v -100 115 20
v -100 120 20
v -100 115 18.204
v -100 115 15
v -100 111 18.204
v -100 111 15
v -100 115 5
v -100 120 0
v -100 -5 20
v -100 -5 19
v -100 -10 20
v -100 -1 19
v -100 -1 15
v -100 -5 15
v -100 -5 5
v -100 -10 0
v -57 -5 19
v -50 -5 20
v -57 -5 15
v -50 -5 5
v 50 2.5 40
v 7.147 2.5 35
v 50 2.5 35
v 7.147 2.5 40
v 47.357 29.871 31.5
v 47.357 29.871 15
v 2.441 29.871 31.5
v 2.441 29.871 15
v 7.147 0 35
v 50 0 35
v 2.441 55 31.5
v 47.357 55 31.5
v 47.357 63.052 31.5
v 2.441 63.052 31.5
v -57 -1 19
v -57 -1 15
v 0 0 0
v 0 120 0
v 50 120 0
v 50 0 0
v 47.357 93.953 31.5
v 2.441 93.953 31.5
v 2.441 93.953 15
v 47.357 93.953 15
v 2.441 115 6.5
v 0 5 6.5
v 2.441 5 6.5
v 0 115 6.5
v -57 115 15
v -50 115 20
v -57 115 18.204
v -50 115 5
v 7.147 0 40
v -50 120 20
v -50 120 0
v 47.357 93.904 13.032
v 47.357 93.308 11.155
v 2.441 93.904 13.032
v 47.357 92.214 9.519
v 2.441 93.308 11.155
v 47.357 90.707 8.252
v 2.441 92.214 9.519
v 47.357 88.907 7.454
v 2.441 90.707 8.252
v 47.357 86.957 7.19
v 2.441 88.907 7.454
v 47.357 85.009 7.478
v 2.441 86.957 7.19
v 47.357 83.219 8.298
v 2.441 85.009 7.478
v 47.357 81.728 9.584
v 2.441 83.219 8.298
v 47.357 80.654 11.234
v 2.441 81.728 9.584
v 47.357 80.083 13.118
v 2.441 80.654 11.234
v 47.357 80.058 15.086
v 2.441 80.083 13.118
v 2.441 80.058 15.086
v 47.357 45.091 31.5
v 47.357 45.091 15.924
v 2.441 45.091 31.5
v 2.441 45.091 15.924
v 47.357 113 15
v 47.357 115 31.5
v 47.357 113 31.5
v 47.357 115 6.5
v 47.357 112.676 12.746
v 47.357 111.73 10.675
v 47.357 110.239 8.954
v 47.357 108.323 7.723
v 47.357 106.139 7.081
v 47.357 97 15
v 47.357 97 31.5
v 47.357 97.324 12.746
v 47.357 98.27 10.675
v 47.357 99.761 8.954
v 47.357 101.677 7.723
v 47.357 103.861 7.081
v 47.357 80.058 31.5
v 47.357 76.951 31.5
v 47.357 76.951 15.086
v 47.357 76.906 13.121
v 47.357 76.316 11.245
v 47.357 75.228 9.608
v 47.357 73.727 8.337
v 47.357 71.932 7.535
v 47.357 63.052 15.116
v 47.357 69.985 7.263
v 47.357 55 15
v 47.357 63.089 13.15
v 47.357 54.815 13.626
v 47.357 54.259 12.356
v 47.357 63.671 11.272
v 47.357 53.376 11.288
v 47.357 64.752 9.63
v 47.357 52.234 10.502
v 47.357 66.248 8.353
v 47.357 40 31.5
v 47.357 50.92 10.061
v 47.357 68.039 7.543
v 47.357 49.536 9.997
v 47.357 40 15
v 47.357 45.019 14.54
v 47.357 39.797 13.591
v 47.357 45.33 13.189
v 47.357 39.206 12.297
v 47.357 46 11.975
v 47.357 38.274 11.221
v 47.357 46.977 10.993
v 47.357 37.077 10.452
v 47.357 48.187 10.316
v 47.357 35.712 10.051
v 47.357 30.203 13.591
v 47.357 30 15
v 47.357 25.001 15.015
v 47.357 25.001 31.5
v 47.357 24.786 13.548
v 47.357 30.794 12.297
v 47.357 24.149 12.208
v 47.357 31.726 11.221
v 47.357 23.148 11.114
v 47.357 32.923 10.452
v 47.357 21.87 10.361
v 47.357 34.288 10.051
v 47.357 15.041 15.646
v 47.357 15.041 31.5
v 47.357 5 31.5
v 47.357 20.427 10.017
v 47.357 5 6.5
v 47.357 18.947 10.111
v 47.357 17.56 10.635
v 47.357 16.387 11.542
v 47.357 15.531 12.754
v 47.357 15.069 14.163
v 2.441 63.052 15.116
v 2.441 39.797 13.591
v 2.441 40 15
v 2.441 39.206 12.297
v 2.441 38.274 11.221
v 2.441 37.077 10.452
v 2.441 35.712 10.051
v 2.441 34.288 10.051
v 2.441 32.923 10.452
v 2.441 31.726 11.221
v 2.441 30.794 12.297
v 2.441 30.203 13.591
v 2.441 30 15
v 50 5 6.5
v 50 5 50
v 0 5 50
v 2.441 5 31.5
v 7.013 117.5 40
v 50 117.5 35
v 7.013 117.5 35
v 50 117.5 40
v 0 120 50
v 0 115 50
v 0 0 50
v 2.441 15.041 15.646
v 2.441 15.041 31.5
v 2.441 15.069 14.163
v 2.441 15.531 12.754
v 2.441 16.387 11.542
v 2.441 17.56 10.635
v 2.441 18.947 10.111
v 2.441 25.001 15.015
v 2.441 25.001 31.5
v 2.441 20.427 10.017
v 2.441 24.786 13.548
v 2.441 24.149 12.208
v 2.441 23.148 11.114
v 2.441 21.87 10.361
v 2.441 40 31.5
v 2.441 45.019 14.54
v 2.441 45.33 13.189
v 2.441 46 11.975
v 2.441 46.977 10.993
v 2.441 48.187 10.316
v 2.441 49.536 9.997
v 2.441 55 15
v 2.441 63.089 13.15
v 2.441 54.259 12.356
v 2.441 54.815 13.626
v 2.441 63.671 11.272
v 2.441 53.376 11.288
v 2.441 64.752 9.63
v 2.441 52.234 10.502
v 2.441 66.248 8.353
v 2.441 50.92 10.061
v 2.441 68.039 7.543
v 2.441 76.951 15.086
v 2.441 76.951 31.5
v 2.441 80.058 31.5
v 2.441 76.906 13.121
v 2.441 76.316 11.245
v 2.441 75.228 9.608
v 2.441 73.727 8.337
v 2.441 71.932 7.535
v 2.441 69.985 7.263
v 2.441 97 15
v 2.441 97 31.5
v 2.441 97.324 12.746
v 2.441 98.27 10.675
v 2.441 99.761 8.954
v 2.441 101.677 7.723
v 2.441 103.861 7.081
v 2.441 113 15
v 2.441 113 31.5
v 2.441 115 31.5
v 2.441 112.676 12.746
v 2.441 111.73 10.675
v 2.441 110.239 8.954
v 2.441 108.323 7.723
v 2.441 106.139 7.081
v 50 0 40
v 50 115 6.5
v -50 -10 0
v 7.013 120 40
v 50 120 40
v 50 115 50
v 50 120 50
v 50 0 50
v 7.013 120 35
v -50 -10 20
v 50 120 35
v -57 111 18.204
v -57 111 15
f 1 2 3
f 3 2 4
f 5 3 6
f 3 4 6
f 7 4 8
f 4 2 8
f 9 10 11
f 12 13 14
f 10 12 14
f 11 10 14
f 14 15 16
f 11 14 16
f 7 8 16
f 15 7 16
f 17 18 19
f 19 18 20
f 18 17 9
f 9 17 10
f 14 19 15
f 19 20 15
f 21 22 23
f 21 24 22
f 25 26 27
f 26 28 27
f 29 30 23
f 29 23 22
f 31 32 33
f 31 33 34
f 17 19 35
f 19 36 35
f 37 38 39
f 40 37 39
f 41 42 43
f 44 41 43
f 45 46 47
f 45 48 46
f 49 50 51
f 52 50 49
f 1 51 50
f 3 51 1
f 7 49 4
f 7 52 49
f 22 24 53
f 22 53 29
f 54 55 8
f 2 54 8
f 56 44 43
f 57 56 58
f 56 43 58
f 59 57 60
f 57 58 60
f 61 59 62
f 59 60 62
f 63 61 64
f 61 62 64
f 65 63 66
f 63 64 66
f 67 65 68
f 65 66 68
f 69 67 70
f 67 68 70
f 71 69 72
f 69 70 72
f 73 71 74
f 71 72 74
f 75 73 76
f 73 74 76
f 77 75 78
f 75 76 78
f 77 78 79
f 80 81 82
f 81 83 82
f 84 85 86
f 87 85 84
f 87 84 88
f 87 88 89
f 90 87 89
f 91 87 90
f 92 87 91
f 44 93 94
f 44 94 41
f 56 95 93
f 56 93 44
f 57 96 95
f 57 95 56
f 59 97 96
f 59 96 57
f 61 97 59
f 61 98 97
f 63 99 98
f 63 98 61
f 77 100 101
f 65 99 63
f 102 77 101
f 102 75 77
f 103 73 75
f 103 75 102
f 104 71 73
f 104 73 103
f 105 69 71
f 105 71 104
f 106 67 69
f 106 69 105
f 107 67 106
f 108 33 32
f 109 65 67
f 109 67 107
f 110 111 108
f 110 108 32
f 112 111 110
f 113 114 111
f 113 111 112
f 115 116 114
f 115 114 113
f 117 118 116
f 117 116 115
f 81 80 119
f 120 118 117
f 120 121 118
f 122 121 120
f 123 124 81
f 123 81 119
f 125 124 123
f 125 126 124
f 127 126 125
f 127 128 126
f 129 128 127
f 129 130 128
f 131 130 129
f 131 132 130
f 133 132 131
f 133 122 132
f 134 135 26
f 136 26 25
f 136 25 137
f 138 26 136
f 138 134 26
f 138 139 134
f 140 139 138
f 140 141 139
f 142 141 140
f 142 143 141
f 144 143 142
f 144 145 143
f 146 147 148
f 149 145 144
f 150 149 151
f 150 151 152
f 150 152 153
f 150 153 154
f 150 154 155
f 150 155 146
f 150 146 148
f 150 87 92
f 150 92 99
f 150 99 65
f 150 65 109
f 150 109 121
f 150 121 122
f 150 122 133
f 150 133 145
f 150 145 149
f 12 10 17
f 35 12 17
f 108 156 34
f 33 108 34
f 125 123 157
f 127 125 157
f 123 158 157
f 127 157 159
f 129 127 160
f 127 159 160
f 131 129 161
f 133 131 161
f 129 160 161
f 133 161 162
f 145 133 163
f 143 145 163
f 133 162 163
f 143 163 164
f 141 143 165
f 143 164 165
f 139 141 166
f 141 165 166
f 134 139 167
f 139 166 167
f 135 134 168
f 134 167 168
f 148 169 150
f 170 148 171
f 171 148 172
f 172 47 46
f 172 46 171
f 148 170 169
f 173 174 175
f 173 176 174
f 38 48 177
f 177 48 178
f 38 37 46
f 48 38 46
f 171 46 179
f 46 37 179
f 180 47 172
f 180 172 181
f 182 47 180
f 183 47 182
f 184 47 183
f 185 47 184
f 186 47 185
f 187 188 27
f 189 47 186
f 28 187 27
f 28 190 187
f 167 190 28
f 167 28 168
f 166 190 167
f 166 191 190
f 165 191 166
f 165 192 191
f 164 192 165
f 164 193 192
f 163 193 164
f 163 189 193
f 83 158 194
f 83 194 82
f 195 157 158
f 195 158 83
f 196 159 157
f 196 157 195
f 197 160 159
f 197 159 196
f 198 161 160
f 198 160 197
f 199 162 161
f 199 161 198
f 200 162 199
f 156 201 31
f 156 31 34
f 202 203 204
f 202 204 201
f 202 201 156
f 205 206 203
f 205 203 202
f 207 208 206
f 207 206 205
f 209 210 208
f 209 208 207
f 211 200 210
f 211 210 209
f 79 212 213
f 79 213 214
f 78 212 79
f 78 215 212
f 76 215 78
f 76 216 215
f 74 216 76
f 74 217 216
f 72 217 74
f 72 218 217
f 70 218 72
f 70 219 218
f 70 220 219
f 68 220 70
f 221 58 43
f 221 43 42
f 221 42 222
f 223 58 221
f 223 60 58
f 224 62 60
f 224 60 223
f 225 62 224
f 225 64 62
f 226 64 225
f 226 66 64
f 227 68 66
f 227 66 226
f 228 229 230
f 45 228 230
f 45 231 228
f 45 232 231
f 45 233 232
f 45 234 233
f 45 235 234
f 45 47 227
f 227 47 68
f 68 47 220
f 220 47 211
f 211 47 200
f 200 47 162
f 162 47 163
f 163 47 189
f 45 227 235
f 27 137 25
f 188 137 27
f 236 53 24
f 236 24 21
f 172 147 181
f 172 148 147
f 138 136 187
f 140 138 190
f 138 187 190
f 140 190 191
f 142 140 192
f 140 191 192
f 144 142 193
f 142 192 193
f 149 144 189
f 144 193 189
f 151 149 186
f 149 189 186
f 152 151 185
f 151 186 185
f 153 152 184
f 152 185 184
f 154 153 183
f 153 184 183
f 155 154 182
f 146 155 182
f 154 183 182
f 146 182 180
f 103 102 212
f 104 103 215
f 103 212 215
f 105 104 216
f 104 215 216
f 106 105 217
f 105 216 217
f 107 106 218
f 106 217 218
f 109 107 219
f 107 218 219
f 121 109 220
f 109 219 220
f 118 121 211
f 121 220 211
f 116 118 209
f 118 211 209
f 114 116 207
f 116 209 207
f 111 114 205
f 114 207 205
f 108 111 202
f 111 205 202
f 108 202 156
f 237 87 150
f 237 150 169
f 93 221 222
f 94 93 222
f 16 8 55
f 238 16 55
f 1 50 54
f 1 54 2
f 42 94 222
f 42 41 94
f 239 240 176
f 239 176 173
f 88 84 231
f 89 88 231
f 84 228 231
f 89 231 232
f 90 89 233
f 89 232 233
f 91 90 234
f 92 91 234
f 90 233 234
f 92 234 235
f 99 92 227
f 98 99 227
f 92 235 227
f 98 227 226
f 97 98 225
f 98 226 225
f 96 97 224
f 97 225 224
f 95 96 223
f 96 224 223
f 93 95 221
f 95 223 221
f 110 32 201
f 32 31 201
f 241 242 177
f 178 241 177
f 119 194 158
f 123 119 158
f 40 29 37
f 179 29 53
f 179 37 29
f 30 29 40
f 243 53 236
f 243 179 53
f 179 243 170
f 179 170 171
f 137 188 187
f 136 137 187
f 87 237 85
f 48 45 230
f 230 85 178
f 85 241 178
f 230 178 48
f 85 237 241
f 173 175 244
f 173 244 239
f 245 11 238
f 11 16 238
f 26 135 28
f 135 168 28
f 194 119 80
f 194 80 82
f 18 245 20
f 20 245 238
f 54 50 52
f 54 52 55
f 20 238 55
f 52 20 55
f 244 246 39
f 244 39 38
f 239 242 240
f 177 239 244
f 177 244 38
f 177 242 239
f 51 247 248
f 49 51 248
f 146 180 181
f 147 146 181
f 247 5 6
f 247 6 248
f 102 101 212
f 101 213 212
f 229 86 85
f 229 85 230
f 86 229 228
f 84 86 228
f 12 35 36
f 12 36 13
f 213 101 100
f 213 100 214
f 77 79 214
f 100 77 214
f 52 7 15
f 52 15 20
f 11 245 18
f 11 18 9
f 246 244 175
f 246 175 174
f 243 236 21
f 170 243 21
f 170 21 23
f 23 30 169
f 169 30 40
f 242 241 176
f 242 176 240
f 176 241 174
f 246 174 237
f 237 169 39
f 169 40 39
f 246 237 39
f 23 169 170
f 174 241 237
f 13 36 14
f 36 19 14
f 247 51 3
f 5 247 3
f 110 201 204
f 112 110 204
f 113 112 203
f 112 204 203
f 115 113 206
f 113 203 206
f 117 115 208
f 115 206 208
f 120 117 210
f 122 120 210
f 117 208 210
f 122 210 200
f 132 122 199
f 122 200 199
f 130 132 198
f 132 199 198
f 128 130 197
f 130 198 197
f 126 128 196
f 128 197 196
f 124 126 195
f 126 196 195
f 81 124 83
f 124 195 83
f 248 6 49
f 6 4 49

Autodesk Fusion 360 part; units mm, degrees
sketch "Sketch1" plane through (0, 0, 0) normal (0, 0, 1) x (1, 0, 0)
  line L0 (0, 0) -> (50, 0)
  line L1 (50, 0) -> (50, 120)
  line L2 (50, 120) -> (0, 120)
  line L3 (0, 120) -> (0, 0)
extrude "Extrude1" add sketch "Sketch1" along normal blind 6.5 makes body 1
sketch "Sketch2" plane through (0, 0, 6.5) normal (0, 0, 1) x (-1, 0, 0)
  line L0 (0, -120) -> (0, 0)
  line L1 (0, 0) -> (-50, 0)
  line L2 (-50, 0) -> (-50, -120)
  line L3 (-50, -120) -> (0, -120)
  line L4 (0, 0) -> (-50, 0)
  line L5 (-50, 0) -> (-50, -5)
  line L6 (-50, -5) -> (0, -5)
  line L7 (0, -5) -> (0, 0)
extrude "Extrude2" add sketch "Sketch2" along normal blind 40 contours L0 L1 L2 L4 L5 L6 L7 bodies 1
sketch "Sketch3" plane through (0, 0, 6.5) normal (0, 0, 1) x (-1, 0, 0)
  line L0 (0, -5) -> (-50, -5)
  line L1 (-50, -5) -> (-50, -120)
  line L2 (-50, -120) -> (0, -120)
  line L3 (0, -120) -> (0, -5)
  line L4 (-50, -120) -> (0, -120)
  line L5 (0, -120) -> (0, -115)
  line L6 (0, -115) -> (-50, -115)
  line L7 (-50, -115) -> (-50, -120)
extrude "Extrude3" add sketch "Sketch3" along normal blind 40 contours L1 L2 L3 L4 L5 L6 L7 bodies 1
sketch "Sketch4" plane through (0, 120, 0) normal (0, 1, 0) x (-1, 0, 0)
  line L0 (-50, 0) -> (0, 0)
  line L1 (0, 0) -> (0, 46.5)
  line L2 (0, 46.5) -> (-50, 46.5)
  line L3 (-50, 46.5) -> (-50, 0)
  line L4 (-50, 46.5) -> (-50, 50)
  line L5 (-50, 50) -> (0, 50)
  line L6 (0, 50) -> (0, 46.5)
extrude "Extrude4" add sketch "Sketch4" against normal blind 5 contours L2 L4 L5 L6 bodies 1
sketch "Sketch5" plane through (0, 0, 46.5) normal (0, 0, 1) x (-1, 0, 0)
  line L0 (0, -5) -> (0, 0)
  line L1 (0, 0) -> (-50, 0)
  line L2 (-50, 0) -> (-50, -5)
  line L3 (-50, -5) -> (0, -5)
  line L4 (0, 0) -> (0, -5)
  line L5 (-50, -5) -> (-50, 0)
extrude "Extrude5" add sketch "Sketch5" along normal blind 3.5 bodies 1
sketch "Sketch6" plane through (0, 120, 0) normal (0, 1, 0) x (-1, 0, 0)
  line L0 (-50, 0) -> (0, 0)
  line L1 (0, 0) -> (0, 50)
  line L2 (0, 50) -> (-50, 50)
  line L3 (-50, 50) -> (-50, 0)
  line L4 (-50, 40) -> (0, 40)
  line L5 (0, 40) -> (0, 35)
  line L6 (0, 35) -> (-50, 35)
  line L7 (-50, 35) -> (-50, 40)
extrude "Extrude6" cut sketch "Sketch6" against normal blind 2.5 contours L1 L3 L4 L5 L6 L7 bodies 1
sketch "Sketch7" plane through (0, 0, 0) normal (0, -1, 0) x (1, 0, 0)
  line L0 (0, 0) -> (50, 0)
  line L1 (50, 0) -> (50, 50)
  line L2 (50, 50) -> (0, 50)
  line L3 (0, 50) -> (0, 0)
  line L4 (0, 40) -> (50, 40)
  line L5 (50, 40) -> (50, 35)
  line L6 (50, 35) -> (0, 35)
  line L7 (0, 35) -> (0, 40)
extrude "Extrude7" cut sketch "Sketch7" against normal blind 2.5 contours L1 L3 L4 L5 L6 L7 bodies 1
sketch "Sketch8" plane through (0, 0, 6.5) normal (0, 0, 1) x (-1, 0, 0)
  line L0 (-50, -115) -> (0, -115)
  line L1 (0, -115) -> (0, -5)
  line L2 (0, -5) -> (-50, -5)
  line L3 (-50, -5) -> (-50, -115)
  line L4 (-2.4411, -115) -> (-47.3569, -115)
  line L5 (-47.3569, -115) -> (-47.3569, -5)
  line L6 (-47.3569, -5) -> (-2.4411, -5)
  line L7 (-2.4411, -5) -> (-2.4411, -115)
extrude "Extrude8" add sketch "Sketch8" along normal blind 10 contours L0 L2 L4 L5 L6 L7 bodies 1
extrude "Extrude9" add 1 faces at (32.385, 41.6667, 16.5) along direction (0, 0, 1) blind 15 on bodies 1 bodies 1
sketch "Sketch9" plane through (2.4411, 0, 0) normal (-1, 0, 0) x (0, -1, 0)
  line L0 (-115, 6.5) -> (-5, 6.5)
  line L1 (-5, 6.5) -> (-5, 31.5)
  line L2 (-5, 31.5) -> (-115, 31.5)
  line L3 (-115, 31.5) -> (-115, 6.5)
  circle A0 centre (-105, 15) radius 8
sketch "Sketch10" plane through (2.4411, 0, 0) normal (-1, 0, 0) x (0, -1, 0)
  line L0 (-113, 15) -> (-97, 15)
  line L1 (-97, 15) -> (-97, 31.5)
  line L2 (-97, 31.5) -> (-113, 31.5)
  line L3 (-113, 31.5) -> (-113, 15)
extrude "Extrude10" cut sketch "Sketch10" against normal blind 70 bodies 1
extrude "Extrude11" cut sketch "Sketch9" against normal blind 70 contours A0 bodies 1
sketch "Sketch11" plane through (2.4411, 0, 0) normal (-1, 0, 0) x (0, -1, 0)
  arc A0 (-113, 15) -> (-97, 15) centre (-105, 15) ccw
  line L0 (-113, 15) -> (-113, 31.5)
  line L1 (-113, 31.5) -> (-115, 31.5)
  line L2 (-115, 31.5) -> (-115, 6.5)
  line L3 (-115, 6.5) -> (-5, 6.5)
  line L4 (-5, 6.5) -> (-5, 31.5)
  line L5 (-5, 31.5) -> (-97, 31.5)
  line L6 (-97, 31.5) -> (-97, 15)
  circle A1 centre (-87, 14.1894) radius 7
  line L7 (-93.9529, 15) -> (-80.0577, 15)
  line L8 (-80.0577, 15) -> (-80.0577, 31.5)
  line L9 (-80.0577, 31.5) -> (-93.9529, 31.5)
  line L10 (-93.9529, 31.5) -> (-93.9529, 15)
  line L11 (-234.0751, -116.6627) -> (-124.5111, -116.6627)
  line L12 (-124.5111, -116.6627) -> (-124.5111, 18.1884)
  line L13 (-124.5111, 18.1884) -> (-234.0751, 18.1884)
  line L14 (-234.0751, 18.1884) -> (-234.0751, -116.6627)
extrude "Extrude12" cut sketch "Sketch11" against normal blind 80 contours L5 A1 L8 L9 L10 | A1 L7 L8 | A1 L7 L8 bodies 1
sketch "Sketch12" plane through (2.4411, 0, 0) normal (-1, 0, 0) x (0, -1, 0)
  line L0 (-80.0577, 31.5) -> (-80.0577, 15.0862)
  arc A0 (-93.9529, 15) -> (-80.0577, 15.0862) centre (-87, 14.1894) ccw
  line L1 (-93.9529, 15) -> (-93.9529, 31.5)
  line L2 (-93.9529, 31.5) -> (-97, 31.5)
  line L3 (-97, 31.5) -> (-97, 15)
  arc A1 (-113, 15) -> (-97, 15) centre (-105, 15) ccw
  line L4 (-113, 15) -> (-113, 31.5)
  line L5 (-113, 31.5) -> (-115, 31.5)
  line L6 (-115, 31.5) -> (-115, 6.5)
  line L7 (-115, 6.5) -> (-5, 6.5)
  line L8 (-5, 6.5) -> (-5, 31.5)
  line L9 (-5, 31.5) -> (-80.0577, 31.5)
  circle A2 centre (-70, 14.2627) radius 7
  line L10 (-76.9514, 15.0862) -> (-63.0522, 15.0862)
  line L11 (-63.0522, 15.0862) -> (-63.0522, 31.5)
  line L12 (-63.0522, 31.5) -> (-76.9514, 31.5)
  line L13 (-76.9514, 31.5) -> (-76.9514, 15.0862)
  dimension "d25" = 14
extrude "Extrude13" cut sketch "Sketch12" against normal blind 80 contours L9 A2 L11 L12 L13 | A2 L10 L11 | A2 L10 L11 bodies 1
sketch "Sketch13" plane through (2.4411, 0, 0) normal (-1, 0, 0) x (0, -1, 0)
  line L0 (-63.0522, 31.5) -> (-63.0522, 15.1163)
  arc A0 (-76.9514, 15.0862) -> (-63.0522, 15.1163) centre (-70, 14.2627) ccw
  line L1 (-76.9514, 15.0862) -> (-76.9514, 31.5)
  line L2 (-76.9514, 31.5) -> (-80.0577, 31.5)
  line L3 (-80.0577, 31.5) -> (-80.0577, 15.0862)
  arc A1 (-93.9529, 15) -> (-80.0577, 15.0862) centre (-87, 14.1894) ccw
  line L4 (-93.9529, 15) -> (-93.9529, 31.5)
  line L5 (-93.9529, 31.5) -> (-97, 31.5)
  line L6 (-97, 31.5) -> (-97, 15)
  arc A2 (-113, 15) -> (-97, 15) centre (-105, 15) ccw
  line L7 (-113, 15) -> (-113, 31.5)
  line L8 (-113, 31.5) -> (-115, 31.5)
  line L9 (-115, 31.5) -> (-115, 6.5)
  line L10 (-115, 6.5) -> (-5, 6.5)
  line L11 (-5, 6.5) -> (-5, 31.5)
  line L12 (-5, 31.5) -> (-63.0522, 31.5)
  circle A3 centre (-50, 14.9754) radius 5
sketch "Sketch14" plane through (2.4411, 0, 0) normal (-1, 0, 0) x (0, -1, 0)
  line L0 (-55, 15) -> (-45.0908, 15)
  line L1 (-45.0908, 15) -> (-45.0908, 31.552)
  line L2 (-45.0908, 31.552) -> (-55, 31.552)
  line L3 (-55, 31.552) -> (-55, 15)
extrude "Extrude14" cut sketch "Sketch13" sketch "Sketch14" against normal blind 900 contours A3 of sketch 2 bodies 1
sketch "Sketch15" plane through (2.4411, 0, 0) normal (-1, 0, 0) x (0, -1, 0)
  line L0 (-55, 15) -> (-55, 31.5)
  line L1 (-55, 31.5) -> (-63.0522, 31.5)
  line L2 (-63.0522, 31.5) -> (-63.0522, 15.1163)
  arc A0 (-76.9514, 15.0862) -> (-63.0522, 15.1163) centre (-70, 14.2627) ccw
  line L3 (-76.9514, 15.0862) -> (-76.9514, 31.5)
  line L4 (-76.9514, 31.5) -> (-80.0577, 31.5)
  line L5 (-80.0577, 31.5) -> (-80.0577, 15.0862)
  arc A1 (-93.9529, 15) -> (-80.0577, 15.0862) centre (-87, 14.1894) ccw
  line L6 (-93.9529, 15) -> (-93.9529, 31.5)
  line L7 (-93.9529, 31.5) -> (-97, 31.5)
  line L8 (-97, 31.5) -> (-97, 15)
  arc A2 (-113, 15) -> (-97, 15) centre (-105, 15) ccw
  line L9 (-113, 15) -> (-113, 31.5)
  line L10 (-113, 31.5) -> (-115, 31.5)
  line L11 (-115, 31.5) -> (-115, 6.5)
  line L12 (-115, 6.5) -> (-5, 6.5)
  line L13 (-5, 6.5) -> (-5, 31.5)
  line L14 (-5, 31.5) -> (-45.0908, 31.5)
  line L15 (-45.0908, 31.5) -> (-45.0908, 15.9237)
  arc A3 (-54.9999, 15) -> (-45.0908, 15.9237) centre (-50, 14.9754) ccw
  line L16 (-54.9999, 15) -> (-55, 15)
  circle A4 centre (-35, 15) radius 5
  line L17 (-40, 15) -> (-29.8713, 15)
  line L18 (-29.8713, 15) -> (-29.8713, 31.5)
  line L19 (-29.8713, 31.5) -> (-40, 31.5)
  line L20 (-40, 31.5) -> (-40, 15)
  dimension "d30" = 10
extrude "Extrude15" cut sketch "Sketch15" against normal blind 90 contours L14 A4 L17 L18 L19 L20 | A4 L17 | A4 L17 bodies 1
sketch "Sketch16" plane through (2.4411, 0, 0) normal (-1, 0, 0) x (0, -1, 0)
  line L0 (-29.8713, 31.5) -> (-29.8713, 15)
  line L1 (-29.8713, 15) -> (-30, 15)
  arc A0 (-40, 15) -> (-30, 15) centre (-35, 15) ccw
  line L2 (-40, 15) -> (-40, 31.5)
  line L3 (-40, 31.5) -> (-45.0908, 31.5)
  line L4 (-45.0908, 31.5) -> (-45.0908, 15.9237)
  arc A1 (-54.9999, 15) -> (-45.0908, 15.9237) centre (-50, 14.9754) ccw
  line L5 (-54.9999, 15) -> (-55, 15)
  line L6 (-55, 15) -> (-55, 31.5)
  line L7 (-55, 31.5) -> (-63.0522, 31.5)
  line L8 (-63.0522, 31.5) -> (-63.0522, 15.1163)
  arc A2 (-76.9514, 15.0862) -> (-63.0522, 15.1163) centre (-70, 14.2627) ccw
  line L9 (-76.9514, 15.0862) -> (-76.9514, 31.5)
  line L10 (-76.9514, 31.5) -> (-80.0577, 31.5)
  line L11 (-80.0577, 31.5) -> (-80.0577, 15.0862)
  arc A3 (-93.9529, 15) -> (-80.0577, 15.0862) centre (-87, 14.1894) ccw
  line L12 (-93.9529, 15) -> (-93.9529, 31.5)
  line L13 (-93.9529, 31.5) -> (-97, 31.5)
  line L14 (-97, 31.5) -> (-97, 15)
  arc A4 (-113, 15) -> (-97, 15) centre (-105, 15) ccw
  line L15 (-113, 15) -> (-113, 31.5)
  line L16 (-113, 31.5) -> (-115, 31.5)
  line L17 (-115, 31.5) -> (-115, 6.5)
  line L18 (-115, 6.5) -> (-5, 6.5)
  line L19 (-5, 6.5) -> (-5, 31.5)
  line L20 (-5, 31.5) -> (-29.8713, 31.5)
  circle A5 centre (-20, 15) radius 5.0013
  line L21 (-25.0012, 15.015) -> (-15.0406, 15.015)
  line L22 (-15.0406, 15.015) -> (-15.0406, 31.5)
  line L23 (-15.0406, 31.5) -> (-25.0012, 31.5)
  line L24 (-25.0012, 31.5) -> (-25.0012, 15.015)
extrude "Extrude16" cut sketch "Sketch16" against normal blind 900 contours L20 A5 L22 L23 L24 | A5 L21 L22 | A5 L21 L22 bodies 1
sketch "Sketch17" plane through (0, 2.5, 0) normal (0, -1, 0) x (1, 0, 0)
  line L0 (0, 35) -> (50, 35)
  line L1 (50, 35) -> (50, 40)
  line L2 (50, 40) -> (0, 40)
  line L3 (0, 40) -> (0, 35)
  line L4 (0, 40) -> (7.1471, 40)
  line L5 (7.1471, 40) -> (7.1471, 35)
  line L6 (7.1471, 35) -> (0, 35)
  line L7 (0, 35) -> (0, 40)
extrude "Extrude17" add sketch "Sketch17" along normal blind 2.5 contours L0 L2 L3 L4 L5 L6 L7 bodies 1
sketch "Sketch18" plane through (0, 117.5, 0) normal (0, 1, 0) x (-1, 0, 0)
  line L0 (-50, 35) -> (0, 35)
  line L1 (0, 35) -> (0, 40)
  line L2 (0, 40) -> (-50, 40)
  line L3 (-50, 40) -> (-50, 35)
  line L4 (0, 35) -> (-7.0127, 35)
  line L5 (-7.0127, 35) -> (-7.0127, 40)
  line L6 (-7.0127, 40) -> (0, 40)
  line L7 (0, 40) -> (0, 35)
extrude "Extrude18" add sketch "Sketch18" along normal blind 2.5 contours L0 L1 L2 L4 L5 L6 L7 bodies 1
sketch "Sketch19" plane through (0, 0, 0) normal (0, 0, 1) x (1, 0, 0)
sketch "Sketch20" plane through (0, 0, 0) normal (0, 0, 1) x (1, 0, 0)
sketch "Sketch21" plane through (0, 0, 0) normal (0, 0, 1) x (1, 0, 0)
  line L0 (-100, 120) -> (-50, 120)
  line L1 (-50, 120) -> (-50, -10)
  line L2 (-50, -10) -> (-100, -10)
  line L3 (-100, -10) -> (-100, 120)
  dimension "d39" = 50
  dimension "d40" = 130
sketch "Sketch22" plane through (0, 0, 0) normal (0, 0, 1) x (1, 0, 0)
  line L0 (-100, 120) -> (-50, 120)
  line L1 (-50, 120) -> (-50, 115)
  line L2 (-50, 115) -> (-100, 115)
  line L3 (-100, 115) -> (-100, 120)
  line L4 (-100, -10) -> (-50, -10)
  line L5 (-50, -10) -> (-50, -5)
  line L6 (-50, -5) -> (-100, -5)
  line L7 (-100, -5) -> (-100, -10)
extrude "Extrude19" add sketch "Sketch22" sketch "Sketch21" along normal blind 5 separate body contours L4 L5 L6 L7 of sketch 2 makes body 2
sketch "Sketch23" plane through (0, 0, 5) normal (0, 0, 1) x (-1, 0, 0)
  line L0 (100, -120) -> (100, 10)
  line L1 (100, 10) -> (50, 10)
  line L2 (50, 10) -> (50, -120)
  line L3 (50, -120) -> (100, -120)
  line L4 (100, 10) -> (50, 10)
  line L5 (50, 10) -> (50, 5)
  line L6 (50, 5) -> (100, 5)
  line L7 (100, 5) -> (100, 10)
  line L8 (100, -120) -> (50, -120)
  line L9 (50, -120) -> (50, -115)
  line L10 (50, -115) -> (100, -115)
  line L11 (100, -115) -> (100, -120)
extrude "Extrude20" add sketch "Sketch23" along normal blind 15 contours L0 L1 L2 L4 L5 L6 L7 bodies 2
sketch "Sketch24" plane through (0, 0, 5) normal (0, 0, 1) x (-1, 0, 0)
  line L0 (100, 5) -> (50, 5)
  line L1 (50, 5) -> (50, -120)
  line L2 (50, -120) -> (100, -120)
  line L3 (100, -120) -> (100, 5)
  line L4 (100, -120) -> (50, -120)
  line L5 (50, -120) -> (50, -115)
  line L6 (50, -115) -> (100, -115)
  line L7 (100, -115) -> (100, -120)
extrude "Extrude21" add sketch "Sketch24" along normal blind 15 contours L1 L2 L3 L4 L5 L6 L7 bodies 2
sketch "Sketch25" plane through (0, 115, 0) normal (0, -1, 0) x (1, 0, 0)
  line L0 (-100, 5) -> (-50, 5)
  line L1 (-50, 5) -> (-50, 20)
  line L2 (-50, 20) -> (-100, 20)
  line L3 (-100, 20) -> (-100, 5)
  line L4 (-100, 15) -> (-50, 15)
  line L5 (-50, 15) -> (-50, 18.2038)
  line L6 (-50, 18.2038) -> (-100, 18.2038)
  line L7 (-100, 18.2038) -> (-100, 15)
extrude "Extrude22" add sketch "Sketch25" along normal blind 4 contours L1 L3 L4 L5 L6 L7 bodies 2
sketch "Sketch26" plane through (0, -5, 0) normal (0, 1, 0) x (-1, 0, 0)
  line L0 (50, 5) -> (100, 5)
  line L1 (100, 5) -> (100, 20)
  line L2 (100, 20) -> (50, 20)
  line L3 (50, 20) -> (50, 5)
sketch "Sketch27" plane through (0, -5, 0) normal (0, 1, 0) x (-1, 0, 0)
sketch "Sketch28" plane through (0, -5, 0) normal (0, 1, 0) x (-1, 0, 0)
  line L0 (50, 15) -> (100, 15)
  line L1 (100, 15) -> (100, 19)
  line L2 (100, 19) -> (50, 19)
  line L3 (50, 19) -> (50, 15)
  dimension "d49" = 50
  dimension "d50" = 4
extrude "Extrude23" add sketch "Sketch28" along normal blind 4 bodies 2
sketch "Sketch29" plane through (0, 111, 0) normal (0, -1, 0) x (1, 0, 0)
  line L0 (-100, 18.2038) -> (-100, 15)
  line L1 (-100, 15) -> (-50, 15)
  line L2 (-50, 15) -> (-50, 18.2038)
  line L3 (-50, 18.2038) -> (-100, 18.2038)
  line L4 (-50, 18.2038) -> (-57, 18.2038)
  line L5 (-57, 18.2038) -> (-57, 15)
  line L6 (-57, 15) -> (-50, 15)
  line L7 (-50, 15) -> (-50, 18.2038)
  dimension "d53" = 7
extrude "Extrude24" cut sketch "Sketch29" against normal blind 4 contours L1 L2 L3 L4 L5 L6 L7 bodies 2
sketch "Sketch30" plane through (0, -1, 0) normal (0, 1, 0) x (-1, 0, 0)
  line L0 (50, 19) -> (50, 15)
  line L1 (50, 15) -> (100, 15)
  line L2 (100, 15) -> (100, 19)
  line L3 (100, 19) -> (50, 19)
  line L4 (50, 15) -> (57, 15)
  line L5 (57, 15) -> (57, 19)
  line L6 (57, 19) -> (50, 19)
  line L7 (50, 19) -> (50, 15)
  dimension "d56" = 7
extrude "Extrude25" cut sketch "Sketch30" against normal blind 4 contours L0 L1 L3 L4 L5 L6 L7 bodies 2
equation "d15 = cm"
